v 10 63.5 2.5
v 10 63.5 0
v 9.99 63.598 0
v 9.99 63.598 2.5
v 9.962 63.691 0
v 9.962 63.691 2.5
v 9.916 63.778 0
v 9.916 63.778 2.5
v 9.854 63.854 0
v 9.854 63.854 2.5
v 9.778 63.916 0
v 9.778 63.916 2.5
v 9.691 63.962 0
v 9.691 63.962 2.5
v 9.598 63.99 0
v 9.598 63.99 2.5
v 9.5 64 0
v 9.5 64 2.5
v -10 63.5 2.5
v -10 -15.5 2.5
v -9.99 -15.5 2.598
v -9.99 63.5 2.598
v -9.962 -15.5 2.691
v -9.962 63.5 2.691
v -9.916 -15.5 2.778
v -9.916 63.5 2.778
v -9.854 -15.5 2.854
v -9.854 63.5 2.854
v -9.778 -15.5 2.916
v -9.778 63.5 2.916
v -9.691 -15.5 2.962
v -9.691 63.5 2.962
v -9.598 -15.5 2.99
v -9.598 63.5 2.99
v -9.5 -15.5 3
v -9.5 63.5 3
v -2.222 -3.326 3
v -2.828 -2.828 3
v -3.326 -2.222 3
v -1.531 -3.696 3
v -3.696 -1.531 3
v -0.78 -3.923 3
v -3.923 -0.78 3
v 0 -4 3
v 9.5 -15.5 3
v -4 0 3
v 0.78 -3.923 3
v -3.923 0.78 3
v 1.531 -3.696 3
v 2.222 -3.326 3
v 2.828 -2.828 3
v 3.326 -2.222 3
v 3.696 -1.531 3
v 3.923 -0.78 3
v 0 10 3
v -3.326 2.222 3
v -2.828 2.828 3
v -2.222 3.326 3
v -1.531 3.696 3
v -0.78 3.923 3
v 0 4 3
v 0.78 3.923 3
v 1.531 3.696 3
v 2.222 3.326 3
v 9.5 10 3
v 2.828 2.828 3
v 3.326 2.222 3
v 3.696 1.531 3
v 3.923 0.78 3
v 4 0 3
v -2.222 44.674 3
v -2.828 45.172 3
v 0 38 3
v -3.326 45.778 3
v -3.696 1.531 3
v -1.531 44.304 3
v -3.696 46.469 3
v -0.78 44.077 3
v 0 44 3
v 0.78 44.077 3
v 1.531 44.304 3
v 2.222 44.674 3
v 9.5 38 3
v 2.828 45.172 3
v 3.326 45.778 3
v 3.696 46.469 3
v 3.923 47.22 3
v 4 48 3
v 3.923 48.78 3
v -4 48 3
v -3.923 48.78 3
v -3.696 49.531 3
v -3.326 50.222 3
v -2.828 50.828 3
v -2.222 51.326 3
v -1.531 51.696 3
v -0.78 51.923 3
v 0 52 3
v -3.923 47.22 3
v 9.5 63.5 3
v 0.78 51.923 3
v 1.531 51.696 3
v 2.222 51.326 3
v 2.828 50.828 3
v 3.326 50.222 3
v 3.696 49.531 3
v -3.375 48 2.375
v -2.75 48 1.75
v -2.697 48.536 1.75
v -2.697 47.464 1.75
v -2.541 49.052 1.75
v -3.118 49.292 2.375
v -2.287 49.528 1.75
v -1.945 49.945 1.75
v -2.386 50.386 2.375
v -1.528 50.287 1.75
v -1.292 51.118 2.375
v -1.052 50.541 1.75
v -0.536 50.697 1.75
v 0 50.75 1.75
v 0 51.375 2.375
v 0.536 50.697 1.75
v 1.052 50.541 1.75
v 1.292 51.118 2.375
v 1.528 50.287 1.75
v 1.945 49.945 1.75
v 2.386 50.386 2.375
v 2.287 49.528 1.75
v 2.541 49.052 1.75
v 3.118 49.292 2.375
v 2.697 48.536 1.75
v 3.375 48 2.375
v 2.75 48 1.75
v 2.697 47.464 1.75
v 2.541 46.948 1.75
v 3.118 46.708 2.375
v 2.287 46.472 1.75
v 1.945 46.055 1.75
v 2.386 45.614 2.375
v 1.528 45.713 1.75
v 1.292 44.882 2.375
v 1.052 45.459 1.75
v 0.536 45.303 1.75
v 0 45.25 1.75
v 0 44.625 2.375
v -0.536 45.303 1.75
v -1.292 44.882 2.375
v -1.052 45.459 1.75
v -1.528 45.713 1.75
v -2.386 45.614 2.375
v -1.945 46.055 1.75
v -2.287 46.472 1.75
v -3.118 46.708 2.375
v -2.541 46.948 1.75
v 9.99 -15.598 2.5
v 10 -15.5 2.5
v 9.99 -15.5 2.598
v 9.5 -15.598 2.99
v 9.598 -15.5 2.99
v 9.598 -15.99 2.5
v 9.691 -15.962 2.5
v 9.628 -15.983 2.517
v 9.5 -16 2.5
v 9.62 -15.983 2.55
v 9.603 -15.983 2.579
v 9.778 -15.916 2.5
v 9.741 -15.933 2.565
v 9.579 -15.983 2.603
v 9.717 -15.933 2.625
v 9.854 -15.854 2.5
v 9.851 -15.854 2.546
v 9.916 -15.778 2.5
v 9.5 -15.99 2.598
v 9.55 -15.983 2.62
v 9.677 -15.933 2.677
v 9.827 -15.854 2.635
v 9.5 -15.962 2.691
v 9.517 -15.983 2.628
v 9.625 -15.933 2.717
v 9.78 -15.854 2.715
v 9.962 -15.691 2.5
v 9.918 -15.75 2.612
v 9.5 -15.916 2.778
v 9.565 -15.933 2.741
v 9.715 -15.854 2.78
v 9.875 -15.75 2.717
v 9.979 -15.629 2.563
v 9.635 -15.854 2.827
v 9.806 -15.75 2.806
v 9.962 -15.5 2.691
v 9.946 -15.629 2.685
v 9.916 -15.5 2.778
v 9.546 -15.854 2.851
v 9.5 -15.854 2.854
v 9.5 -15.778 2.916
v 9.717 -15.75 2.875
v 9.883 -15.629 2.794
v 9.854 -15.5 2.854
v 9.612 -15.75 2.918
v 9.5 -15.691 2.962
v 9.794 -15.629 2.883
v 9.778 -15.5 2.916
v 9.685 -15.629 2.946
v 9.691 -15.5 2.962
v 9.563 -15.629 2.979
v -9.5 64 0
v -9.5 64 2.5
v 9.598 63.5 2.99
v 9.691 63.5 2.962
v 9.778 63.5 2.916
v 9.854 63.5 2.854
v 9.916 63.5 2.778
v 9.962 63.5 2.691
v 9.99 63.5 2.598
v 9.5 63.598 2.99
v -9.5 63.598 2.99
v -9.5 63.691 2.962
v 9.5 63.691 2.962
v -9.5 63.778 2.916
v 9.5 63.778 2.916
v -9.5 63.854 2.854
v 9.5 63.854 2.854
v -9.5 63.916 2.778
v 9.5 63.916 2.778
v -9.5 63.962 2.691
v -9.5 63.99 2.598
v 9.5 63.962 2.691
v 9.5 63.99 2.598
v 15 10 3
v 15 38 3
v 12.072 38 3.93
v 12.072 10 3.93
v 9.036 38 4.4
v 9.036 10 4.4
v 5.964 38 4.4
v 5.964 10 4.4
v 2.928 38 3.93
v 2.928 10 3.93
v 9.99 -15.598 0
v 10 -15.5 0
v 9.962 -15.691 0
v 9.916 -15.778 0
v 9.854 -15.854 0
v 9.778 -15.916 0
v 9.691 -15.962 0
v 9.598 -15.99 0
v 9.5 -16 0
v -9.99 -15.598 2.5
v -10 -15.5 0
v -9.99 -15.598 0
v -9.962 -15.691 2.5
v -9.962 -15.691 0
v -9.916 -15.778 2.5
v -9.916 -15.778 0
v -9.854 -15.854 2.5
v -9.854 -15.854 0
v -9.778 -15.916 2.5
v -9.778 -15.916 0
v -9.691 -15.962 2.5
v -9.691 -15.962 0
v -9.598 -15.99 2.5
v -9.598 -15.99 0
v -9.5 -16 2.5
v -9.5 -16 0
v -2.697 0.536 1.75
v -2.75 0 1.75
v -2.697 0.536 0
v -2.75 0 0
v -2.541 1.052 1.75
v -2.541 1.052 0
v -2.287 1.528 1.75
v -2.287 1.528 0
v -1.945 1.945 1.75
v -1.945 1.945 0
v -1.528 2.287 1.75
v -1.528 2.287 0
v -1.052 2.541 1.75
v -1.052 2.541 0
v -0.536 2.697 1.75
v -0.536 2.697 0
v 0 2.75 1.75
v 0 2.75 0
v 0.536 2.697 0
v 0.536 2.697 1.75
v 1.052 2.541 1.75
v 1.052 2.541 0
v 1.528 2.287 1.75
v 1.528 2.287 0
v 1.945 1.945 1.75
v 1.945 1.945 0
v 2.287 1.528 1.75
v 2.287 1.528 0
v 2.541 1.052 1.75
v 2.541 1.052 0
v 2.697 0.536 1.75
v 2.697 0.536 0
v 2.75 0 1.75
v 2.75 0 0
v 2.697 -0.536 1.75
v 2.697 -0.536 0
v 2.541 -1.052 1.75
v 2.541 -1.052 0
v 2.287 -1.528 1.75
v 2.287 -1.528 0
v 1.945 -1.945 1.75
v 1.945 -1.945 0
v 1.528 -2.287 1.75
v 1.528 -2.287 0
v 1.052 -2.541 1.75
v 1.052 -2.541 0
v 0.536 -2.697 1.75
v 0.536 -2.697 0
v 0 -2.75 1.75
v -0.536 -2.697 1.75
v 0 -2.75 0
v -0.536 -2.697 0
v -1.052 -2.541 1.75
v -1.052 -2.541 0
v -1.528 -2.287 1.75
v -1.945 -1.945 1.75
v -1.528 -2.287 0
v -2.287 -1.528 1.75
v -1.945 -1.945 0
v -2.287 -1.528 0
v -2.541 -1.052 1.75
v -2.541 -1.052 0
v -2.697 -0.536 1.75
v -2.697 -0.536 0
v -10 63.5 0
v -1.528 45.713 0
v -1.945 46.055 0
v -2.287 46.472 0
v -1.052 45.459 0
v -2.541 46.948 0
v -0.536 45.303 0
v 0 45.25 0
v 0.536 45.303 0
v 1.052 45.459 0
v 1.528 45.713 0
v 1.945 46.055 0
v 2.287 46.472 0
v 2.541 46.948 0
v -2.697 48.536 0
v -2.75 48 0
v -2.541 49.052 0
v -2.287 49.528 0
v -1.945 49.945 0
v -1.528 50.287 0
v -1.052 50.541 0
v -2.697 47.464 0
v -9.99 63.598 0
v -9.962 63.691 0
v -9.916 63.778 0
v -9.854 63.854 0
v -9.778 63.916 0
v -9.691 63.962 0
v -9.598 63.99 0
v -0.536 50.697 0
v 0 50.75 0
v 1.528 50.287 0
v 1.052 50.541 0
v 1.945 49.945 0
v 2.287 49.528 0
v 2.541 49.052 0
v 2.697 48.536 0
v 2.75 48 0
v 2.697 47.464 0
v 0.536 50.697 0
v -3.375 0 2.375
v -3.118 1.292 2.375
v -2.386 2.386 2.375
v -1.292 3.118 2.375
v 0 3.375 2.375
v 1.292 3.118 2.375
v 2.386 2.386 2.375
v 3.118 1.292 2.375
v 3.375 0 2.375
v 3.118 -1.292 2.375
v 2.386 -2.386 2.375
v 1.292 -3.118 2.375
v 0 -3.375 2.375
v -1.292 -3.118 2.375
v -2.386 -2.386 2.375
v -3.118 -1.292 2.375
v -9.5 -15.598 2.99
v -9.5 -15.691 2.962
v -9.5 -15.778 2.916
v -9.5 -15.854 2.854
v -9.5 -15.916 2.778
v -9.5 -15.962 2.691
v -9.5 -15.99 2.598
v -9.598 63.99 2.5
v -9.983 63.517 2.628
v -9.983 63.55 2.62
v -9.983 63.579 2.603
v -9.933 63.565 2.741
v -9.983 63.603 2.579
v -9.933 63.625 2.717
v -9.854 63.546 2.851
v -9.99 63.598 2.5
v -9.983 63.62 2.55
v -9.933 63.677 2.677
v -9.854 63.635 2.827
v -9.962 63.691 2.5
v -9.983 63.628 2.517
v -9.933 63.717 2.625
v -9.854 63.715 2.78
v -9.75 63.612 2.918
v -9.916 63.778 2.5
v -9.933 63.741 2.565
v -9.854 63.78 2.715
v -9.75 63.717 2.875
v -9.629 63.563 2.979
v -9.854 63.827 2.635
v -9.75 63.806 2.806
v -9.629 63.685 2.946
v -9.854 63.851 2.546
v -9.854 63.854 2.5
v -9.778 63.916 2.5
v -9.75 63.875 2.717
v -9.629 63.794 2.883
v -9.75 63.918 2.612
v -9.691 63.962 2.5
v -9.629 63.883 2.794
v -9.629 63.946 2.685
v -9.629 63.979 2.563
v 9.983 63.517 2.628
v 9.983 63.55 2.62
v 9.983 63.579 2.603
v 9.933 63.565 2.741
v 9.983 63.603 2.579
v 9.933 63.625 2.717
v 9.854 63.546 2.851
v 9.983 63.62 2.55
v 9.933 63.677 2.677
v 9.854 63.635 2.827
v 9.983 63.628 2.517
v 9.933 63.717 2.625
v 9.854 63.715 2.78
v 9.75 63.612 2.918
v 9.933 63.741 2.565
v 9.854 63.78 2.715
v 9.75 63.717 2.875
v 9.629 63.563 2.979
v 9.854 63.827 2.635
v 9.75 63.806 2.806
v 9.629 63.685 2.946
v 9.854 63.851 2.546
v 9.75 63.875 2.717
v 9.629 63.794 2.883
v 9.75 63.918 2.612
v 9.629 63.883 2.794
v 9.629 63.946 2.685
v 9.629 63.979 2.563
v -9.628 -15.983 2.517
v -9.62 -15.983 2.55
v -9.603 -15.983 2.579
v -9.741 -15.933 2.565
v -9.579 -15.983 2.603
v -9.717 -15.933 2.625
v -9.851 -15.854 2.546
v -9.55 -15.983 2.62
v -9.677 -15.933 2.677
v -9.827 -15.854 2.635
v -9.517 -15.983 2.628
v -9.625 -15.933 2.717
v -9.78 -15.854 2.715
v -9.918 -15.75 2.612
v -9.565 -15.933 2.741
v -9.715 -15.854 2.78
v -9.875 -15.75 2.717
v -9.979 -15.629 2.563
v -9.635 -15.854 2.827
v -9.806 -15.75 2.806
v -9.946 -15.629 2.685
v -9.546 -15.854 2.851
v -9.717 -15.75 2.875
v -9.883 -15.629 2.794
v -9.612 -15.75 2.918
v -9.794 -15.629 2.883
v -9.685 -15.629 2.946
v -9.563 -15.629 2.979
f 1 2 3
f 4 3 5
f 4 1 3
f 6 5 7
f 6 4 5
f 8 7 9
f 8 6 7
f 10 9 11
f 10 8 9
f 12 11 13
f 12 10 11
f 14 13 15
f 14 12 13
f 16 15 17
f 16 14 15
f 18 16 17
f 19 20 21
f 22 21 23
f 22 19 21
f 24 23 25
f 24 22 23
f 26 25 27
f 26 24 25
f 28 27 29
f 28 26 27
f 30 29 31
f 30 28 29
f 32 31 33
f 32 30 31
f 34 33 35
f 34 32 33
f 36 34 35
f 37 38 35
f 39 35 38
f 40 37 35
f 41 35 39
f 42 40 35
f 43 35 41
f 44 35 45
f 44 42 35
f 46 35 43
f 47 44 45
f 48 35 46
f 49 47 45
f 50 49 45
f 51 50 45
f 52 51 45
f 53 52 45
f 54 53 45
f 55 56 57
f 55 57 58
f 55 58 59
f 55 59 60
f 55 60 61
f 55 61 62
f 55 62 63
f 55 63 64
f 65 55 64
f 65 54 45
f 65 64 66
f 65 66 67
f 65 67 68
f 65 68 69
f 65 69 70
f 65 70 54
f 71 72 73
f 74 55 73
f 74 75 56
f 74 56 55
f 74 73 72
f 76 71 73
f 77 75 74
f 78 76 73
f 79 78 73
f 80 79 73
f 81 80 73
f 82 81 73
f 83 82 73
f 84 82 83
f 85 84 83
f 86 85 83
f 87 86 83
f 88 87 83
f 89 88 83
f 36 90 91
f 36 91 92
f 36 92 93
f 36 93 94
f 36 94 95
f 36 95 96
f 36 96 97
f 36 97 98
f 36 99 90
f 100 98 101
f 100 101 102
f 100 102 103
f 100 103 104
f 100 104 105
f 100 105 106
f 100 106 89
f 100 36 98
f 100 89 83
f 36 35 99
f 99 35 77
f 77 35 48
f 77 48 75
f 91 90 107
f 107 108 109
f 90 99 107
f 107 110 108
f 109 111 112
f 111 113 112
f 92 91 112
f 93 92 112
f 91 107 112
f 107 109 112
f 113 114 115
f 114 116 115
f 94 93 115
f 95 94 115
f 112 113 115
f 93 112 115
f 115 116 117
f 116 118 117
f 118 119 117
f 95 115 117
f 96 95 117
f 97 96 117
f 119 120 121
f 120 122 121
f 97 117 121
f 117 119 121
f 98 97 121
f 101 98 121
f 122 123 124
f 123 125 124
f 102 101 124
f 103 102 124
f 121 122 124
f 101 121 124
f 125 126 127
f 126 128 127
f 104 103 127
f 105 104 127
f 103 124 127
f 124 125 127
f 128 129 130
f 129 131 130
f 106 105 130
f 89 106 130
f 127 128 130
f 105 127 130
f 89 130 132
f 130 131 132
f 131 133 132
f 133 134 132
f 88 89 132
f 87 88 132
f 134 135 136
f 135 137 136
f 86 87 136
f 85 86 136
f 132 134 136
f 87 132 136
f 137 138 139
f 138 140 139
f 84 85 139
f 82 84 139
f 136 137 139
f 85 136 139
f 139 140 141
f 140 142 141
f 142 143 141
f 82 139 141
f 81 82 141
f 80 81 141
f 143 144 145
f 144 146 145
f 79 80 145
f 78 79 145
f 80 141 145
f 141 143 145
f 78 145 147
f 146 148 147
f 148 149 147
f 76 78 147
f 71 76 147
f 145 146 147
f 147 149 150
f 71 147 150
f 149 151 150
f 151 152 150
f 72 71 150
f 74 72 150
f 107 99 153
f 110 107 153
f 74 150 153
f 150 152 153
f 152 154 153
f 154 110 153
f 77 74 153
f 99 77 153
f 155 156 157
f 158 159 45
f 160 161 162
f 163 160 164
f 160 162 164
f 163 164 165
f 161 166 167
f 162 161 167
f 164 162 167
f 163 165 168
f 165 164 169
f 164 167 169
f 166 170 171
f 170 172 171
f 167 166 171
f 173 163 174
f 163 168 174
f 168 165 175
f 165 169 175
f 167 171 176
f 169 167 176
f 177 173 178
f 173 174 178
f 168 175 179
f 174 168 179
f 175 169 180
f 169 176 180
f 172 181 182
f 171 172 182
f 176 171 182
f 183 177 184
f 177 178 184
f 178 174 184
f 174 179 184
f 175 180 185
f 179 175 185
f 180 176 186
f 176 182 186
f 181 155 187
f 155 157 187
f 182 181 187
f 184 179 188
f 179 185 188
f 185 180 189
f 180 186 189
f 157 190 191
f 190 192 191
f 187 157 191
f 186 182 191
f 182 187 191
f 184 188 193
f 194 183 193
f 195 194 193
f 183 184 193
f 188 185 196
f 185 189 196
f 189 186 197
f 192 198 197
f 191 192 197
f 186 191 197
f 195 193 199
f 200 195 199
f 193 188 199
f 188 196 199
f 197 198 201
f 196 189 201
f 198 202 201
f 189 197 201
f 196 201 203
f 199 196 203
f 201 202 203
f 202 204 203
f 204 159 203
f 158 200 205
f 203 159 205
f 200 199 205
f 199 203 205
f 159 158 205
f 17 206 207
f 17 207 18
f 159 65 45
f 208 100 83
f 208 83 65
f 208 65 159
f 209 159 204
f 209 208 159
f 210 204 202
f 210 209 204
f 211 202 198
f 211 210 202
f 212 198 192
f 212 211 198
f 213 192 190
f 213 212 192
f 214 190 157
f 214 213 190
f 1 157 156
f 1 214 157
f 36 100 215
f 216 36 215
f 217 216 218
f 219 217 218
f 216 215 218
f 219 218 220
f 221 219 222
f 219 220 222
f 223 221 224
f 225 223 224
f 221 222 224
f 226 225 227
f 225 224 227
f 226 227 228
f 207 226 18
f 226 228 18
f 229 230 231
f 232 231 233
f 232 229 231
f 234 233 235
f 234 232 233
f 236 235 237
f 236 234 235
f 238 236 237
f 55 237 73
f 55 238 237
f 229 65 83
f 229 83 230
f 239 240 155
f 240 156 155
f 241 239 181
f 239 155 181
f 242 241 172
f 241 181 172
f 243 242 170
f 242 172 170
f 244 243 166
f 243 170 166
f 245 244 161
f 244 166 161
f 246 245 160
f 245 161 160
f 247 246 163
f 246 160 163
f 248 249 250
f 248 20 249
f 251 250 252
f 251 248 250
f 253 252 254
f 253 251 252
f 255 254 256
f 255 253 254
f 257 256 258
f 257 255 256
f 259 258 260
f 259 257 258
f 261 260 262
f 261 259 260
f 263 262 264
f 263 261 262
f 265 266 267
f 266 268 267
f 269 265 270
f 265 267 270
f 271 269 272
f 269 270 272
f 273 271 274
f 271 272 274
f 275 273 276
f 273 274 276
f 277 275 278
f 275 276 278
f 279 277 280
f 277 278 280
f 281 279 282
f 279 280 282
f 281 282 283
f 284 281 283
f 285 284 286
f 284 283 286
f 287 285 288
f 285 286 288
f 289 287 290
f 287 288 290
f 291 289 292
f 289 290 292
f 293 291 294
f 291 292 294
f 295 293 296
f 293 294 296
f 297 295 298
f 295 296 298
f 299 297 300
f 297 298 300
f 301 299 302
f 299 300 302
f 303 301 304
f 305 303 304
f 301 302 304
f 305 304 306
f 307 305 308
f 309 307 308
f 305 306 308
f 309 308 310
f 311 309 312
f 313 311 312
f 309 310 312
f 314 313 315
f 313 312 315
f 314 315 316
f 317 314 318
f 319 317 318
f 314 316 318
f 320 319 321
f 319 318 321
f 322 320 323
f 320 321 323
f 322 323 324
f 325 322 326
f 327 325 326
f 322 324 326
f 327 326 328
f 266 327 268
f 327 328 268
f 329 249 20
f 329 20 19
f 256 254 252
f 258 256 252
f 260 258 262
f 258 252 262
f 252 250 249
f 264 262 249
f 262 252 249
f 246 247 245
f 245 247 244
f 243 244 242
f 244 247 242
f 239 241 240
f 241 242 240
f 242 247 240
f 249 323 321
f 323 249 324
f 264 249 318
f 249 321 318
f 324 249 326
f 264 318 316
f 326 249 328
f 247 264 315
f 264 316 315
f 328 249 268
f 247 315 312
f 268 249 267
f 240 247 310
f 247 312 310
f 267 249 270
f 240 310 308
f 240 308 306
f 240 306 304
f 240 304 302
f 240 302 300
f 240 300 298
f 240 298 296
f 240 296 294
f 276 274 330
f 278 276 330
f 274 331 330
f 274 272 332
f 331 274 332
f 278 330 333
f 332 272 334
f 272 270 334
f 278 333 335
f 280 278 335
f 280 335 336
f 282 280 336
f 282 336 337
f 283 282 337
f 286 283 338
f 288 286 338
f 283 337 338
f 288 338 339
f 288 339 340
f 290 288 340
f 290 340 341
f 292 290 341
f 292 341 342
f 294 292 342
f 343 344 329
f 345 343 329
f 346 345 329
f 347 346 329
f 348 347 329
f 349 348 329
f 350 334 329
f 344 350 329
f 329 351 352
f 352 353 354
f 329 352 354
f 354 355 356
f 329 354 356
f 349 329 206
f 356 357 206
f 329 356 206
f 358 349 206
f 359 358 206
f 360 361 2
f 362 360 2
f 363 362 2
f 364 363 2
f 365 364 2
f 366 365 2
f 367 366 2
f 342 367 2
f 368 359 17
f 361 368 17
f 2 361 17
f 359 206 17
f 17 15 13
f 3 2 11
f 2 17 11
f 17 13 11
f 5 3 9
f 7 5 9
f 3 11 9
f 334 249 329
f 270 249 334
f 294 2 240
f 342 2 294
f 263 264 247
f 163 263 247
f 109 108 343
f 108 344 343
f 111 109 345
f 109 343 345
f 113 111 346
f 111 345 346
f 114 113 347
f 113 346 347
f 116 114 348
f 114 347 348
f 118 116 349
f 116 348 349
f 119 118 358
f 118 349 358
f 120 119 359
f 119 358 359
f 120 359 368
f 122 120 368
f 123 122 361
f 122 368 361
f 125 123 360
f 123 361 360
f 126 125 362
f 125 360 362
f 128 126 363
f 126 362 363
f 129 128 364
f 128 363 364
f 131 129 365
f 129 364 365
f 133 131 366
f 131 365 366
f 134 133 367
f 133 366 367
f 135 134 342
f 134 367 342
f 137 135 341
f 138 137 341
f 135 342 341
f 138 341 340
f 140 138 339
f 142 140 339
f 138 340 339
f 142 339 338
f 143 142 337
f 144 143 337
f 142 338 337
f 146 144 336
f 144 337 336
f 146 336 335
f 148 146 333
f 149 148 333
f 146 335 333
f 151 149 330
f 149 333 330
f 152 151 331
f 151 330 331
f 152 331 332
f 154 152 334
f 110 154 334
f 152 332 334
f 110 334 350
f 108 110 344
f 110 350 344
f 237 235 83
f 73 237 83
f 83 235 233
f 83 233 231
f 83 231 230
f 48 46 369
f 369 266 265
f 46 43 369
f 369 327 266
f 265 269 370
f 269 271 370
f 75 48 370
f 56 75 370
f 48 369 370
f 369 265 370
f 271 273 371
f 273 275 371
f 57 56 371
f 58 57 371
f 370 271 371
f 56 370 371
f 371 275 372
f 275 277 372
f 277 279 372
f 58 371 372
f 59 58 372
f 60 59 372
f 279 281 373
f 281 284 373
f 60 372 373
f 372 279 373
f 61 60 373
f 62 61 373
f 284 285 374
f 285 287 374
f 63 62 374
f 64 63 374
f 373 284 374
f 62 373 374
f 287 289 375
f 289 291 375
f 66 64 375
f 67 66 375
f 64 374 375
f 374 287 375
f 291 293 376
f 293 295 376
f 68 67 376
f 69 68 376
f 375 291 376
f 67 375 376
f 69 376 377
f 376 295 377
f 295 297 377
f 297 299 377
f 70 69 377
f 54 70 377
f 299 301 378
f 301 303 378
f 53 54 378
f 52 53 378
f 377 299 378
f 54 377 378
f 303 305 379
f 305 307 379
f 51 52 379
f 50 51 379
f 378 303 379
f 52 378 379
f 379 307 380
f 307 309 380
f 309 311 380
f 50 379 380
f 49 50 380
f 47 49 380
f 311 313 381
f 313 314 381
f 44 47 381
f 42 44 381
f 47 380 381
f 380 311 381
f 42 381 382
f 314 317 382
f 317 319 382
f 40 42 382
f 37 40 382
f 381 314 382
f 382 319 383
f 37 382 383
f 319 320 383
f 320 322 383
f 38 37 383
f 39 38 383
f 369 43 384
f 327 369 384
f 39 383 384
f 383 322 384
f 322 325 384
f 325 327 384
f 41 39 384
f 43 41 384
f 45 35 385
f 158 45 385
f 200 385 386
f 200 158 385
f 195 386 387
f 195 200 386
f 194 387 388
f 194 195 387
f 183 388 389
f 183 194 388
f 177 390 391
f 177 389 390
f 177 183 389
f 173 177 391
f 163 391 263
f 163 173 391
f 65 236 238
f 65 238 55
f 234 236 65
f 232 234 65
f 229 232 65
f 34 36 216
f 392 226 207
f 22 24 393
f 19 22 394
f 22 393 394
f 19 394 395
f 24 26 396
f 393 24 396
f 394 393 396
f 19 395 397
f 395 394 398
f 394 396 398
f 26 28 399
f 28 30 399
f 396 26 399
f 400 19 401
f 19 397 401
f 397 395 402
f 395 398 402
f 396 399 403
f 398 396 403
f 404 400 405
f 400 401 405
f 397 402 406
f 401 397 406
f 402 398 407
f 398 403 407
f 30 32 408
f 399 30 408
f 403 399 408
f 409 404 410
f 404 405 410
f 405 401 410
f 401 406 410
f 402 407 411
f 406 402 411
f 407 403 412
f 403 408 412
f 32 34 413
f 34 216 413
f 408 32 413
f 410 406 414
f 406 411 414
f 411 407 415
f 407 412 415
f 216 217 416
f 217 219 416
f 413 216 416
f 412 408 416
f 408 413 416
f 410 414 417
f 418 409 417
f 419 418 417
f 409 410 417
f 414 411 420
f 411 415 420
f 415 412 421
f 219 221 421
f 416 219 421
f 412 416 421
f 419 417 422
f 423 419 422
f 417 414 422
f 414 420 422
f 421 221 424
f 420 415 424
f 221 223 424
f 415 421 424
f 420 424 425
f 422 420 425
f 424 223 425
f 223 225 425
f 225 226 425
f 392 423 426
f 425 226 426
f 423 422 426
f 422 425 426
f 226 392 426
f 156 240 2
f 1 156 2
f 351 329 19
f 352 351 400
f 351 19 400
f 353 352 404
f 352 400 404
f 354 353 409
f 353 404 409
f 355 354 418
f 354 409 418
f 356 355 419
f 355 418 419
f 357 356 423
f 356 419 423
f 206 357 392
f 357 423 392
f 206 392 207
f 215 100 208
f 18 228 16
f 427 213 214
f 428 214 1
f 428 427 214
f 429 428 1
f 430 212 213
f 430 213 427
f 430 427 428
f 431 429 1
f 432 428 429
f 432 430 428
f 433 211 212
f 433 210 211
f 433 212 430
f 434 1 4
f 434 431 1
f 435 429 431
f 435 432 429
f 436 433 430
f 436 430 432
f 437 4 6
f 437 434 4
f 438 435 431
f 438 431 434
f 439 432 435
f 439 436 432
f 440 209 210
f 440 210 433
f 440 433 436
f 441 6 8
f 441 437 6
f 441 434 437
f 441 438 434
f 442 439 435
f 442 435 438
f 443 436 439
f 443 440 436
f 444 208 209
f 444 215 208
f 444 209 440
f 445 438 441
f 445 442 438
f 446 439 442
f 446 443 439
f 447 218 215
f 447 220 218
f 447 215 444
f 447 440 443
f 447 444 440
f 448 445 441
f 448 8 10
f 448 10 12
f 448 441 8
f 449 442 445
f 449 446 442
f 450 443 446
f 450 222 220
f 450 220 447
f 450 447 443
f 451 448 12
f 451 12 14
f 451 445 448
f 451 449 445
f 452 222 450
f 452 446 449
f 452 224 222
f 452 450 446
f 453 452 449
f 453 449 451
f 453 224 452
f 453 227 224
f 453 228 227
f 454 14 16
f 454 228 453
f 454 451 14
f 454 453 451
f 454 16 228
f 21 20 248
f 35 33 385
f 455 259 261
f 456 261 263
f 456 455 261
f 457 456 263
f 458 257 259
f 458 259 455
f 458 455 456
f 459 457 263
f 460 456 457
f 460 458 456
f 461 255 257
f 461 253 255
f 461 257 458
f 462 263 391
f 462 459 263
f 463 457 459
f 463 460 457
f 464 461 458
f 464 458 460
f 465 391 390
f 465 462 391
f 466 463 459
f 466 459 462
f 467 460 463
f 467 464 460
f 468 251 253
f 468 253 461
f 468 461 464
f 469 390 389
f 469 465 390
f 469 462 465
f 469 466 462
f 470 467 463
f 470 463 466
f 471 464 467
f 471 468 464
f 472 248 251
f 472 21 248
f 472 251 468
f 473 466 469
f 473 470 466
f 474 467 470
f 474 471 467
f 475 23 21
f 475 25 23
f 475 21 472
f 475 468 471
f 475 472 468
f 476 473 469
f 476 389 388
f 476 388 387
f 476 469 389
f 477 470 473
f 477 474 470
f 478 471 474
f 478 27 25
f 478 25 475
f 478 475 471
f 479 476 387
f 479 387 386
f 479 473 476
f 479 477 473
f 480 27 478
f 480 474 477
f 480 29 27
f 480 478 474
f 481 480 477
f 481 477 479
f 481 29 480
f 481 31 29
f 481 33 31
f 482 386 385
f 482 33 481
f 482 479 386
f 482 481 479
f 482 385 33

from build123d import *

# Parameters (mm, degrees)
F0_W           = 20
F0_H           = 80
F1_DEPTH       = 3
F5_D           = 5.5
F5_DEPTH       = 15
F5_CSINK_D     = 8
F5_CSINK_ANGLE = 90
F5_TIP         = 1.6523667023
F7_R           = 0.5
F10_DEPTH      = 28


# Not quite as in the source:
# - two fillets or chamfers of one size are made in one step


with BuildPart() as f1:
    # F0 (on Top) → F1 (new body)
    with BuildSketch(Plane.XY):
        with Locations((0, 24)):
            Rectangle(F0_W, F0_H)
    extrude(amount=F1_DEPTH)

    # F5
    with Locations(Plane.XY.offset(3)):
        with Locations((0, 0), (0, 48)):
            CounterSinkHole(F5_D / 2, F5_CSINK_D / 2, depth=F5_DEPTH, counter_sink_angle=F5_CSINK_ANGLE)
            with Locations((0, 0, -(F5_DEPTH + F5_TIP / 2))):  # 118° drill point
                Cone(0, F5_D / 2, F5_TIP, mode=Mode.SUBTRACT)

    # F7
    f7_edges = [f1.edges().sort_by_distance(p)[0] for p in [
        (0, 64, 3),
        (-10, 24, 3),
        (10, 24, 3),
        (-10, -16, 1.5),
        (-10, 64, 1.5),
        (10, 64, 1.5),
        (10, -16, 1.5),
        (0, -16, 3),
    ]]
    fillet(f7_edges, radius=F7_R)

    # F9 (on offset) → F10 (join)
    with BuildSketch(Plane.XZ.offset(-10)):
        with BuildLine():
            ThreePointArc((13, 3), (7.5, 3.860863499), (2, 3))
            Line((2, 3), (10, 3))
            Line((10, 3), (13, 3))
        make_face()
        with BuildLine():
            Line((0, 3), (2, 3))
            ThreePointArc((2, 3), (7.5, 3.860863499), (13, 3))
            Line((13, 3), (15, 3))
            ThreePointArc((15, 3), (7.5, 4.4595037823), (0, 3))
        make_face()
    extrude(amount=-F10_DEPTH)


solid = f1.part
